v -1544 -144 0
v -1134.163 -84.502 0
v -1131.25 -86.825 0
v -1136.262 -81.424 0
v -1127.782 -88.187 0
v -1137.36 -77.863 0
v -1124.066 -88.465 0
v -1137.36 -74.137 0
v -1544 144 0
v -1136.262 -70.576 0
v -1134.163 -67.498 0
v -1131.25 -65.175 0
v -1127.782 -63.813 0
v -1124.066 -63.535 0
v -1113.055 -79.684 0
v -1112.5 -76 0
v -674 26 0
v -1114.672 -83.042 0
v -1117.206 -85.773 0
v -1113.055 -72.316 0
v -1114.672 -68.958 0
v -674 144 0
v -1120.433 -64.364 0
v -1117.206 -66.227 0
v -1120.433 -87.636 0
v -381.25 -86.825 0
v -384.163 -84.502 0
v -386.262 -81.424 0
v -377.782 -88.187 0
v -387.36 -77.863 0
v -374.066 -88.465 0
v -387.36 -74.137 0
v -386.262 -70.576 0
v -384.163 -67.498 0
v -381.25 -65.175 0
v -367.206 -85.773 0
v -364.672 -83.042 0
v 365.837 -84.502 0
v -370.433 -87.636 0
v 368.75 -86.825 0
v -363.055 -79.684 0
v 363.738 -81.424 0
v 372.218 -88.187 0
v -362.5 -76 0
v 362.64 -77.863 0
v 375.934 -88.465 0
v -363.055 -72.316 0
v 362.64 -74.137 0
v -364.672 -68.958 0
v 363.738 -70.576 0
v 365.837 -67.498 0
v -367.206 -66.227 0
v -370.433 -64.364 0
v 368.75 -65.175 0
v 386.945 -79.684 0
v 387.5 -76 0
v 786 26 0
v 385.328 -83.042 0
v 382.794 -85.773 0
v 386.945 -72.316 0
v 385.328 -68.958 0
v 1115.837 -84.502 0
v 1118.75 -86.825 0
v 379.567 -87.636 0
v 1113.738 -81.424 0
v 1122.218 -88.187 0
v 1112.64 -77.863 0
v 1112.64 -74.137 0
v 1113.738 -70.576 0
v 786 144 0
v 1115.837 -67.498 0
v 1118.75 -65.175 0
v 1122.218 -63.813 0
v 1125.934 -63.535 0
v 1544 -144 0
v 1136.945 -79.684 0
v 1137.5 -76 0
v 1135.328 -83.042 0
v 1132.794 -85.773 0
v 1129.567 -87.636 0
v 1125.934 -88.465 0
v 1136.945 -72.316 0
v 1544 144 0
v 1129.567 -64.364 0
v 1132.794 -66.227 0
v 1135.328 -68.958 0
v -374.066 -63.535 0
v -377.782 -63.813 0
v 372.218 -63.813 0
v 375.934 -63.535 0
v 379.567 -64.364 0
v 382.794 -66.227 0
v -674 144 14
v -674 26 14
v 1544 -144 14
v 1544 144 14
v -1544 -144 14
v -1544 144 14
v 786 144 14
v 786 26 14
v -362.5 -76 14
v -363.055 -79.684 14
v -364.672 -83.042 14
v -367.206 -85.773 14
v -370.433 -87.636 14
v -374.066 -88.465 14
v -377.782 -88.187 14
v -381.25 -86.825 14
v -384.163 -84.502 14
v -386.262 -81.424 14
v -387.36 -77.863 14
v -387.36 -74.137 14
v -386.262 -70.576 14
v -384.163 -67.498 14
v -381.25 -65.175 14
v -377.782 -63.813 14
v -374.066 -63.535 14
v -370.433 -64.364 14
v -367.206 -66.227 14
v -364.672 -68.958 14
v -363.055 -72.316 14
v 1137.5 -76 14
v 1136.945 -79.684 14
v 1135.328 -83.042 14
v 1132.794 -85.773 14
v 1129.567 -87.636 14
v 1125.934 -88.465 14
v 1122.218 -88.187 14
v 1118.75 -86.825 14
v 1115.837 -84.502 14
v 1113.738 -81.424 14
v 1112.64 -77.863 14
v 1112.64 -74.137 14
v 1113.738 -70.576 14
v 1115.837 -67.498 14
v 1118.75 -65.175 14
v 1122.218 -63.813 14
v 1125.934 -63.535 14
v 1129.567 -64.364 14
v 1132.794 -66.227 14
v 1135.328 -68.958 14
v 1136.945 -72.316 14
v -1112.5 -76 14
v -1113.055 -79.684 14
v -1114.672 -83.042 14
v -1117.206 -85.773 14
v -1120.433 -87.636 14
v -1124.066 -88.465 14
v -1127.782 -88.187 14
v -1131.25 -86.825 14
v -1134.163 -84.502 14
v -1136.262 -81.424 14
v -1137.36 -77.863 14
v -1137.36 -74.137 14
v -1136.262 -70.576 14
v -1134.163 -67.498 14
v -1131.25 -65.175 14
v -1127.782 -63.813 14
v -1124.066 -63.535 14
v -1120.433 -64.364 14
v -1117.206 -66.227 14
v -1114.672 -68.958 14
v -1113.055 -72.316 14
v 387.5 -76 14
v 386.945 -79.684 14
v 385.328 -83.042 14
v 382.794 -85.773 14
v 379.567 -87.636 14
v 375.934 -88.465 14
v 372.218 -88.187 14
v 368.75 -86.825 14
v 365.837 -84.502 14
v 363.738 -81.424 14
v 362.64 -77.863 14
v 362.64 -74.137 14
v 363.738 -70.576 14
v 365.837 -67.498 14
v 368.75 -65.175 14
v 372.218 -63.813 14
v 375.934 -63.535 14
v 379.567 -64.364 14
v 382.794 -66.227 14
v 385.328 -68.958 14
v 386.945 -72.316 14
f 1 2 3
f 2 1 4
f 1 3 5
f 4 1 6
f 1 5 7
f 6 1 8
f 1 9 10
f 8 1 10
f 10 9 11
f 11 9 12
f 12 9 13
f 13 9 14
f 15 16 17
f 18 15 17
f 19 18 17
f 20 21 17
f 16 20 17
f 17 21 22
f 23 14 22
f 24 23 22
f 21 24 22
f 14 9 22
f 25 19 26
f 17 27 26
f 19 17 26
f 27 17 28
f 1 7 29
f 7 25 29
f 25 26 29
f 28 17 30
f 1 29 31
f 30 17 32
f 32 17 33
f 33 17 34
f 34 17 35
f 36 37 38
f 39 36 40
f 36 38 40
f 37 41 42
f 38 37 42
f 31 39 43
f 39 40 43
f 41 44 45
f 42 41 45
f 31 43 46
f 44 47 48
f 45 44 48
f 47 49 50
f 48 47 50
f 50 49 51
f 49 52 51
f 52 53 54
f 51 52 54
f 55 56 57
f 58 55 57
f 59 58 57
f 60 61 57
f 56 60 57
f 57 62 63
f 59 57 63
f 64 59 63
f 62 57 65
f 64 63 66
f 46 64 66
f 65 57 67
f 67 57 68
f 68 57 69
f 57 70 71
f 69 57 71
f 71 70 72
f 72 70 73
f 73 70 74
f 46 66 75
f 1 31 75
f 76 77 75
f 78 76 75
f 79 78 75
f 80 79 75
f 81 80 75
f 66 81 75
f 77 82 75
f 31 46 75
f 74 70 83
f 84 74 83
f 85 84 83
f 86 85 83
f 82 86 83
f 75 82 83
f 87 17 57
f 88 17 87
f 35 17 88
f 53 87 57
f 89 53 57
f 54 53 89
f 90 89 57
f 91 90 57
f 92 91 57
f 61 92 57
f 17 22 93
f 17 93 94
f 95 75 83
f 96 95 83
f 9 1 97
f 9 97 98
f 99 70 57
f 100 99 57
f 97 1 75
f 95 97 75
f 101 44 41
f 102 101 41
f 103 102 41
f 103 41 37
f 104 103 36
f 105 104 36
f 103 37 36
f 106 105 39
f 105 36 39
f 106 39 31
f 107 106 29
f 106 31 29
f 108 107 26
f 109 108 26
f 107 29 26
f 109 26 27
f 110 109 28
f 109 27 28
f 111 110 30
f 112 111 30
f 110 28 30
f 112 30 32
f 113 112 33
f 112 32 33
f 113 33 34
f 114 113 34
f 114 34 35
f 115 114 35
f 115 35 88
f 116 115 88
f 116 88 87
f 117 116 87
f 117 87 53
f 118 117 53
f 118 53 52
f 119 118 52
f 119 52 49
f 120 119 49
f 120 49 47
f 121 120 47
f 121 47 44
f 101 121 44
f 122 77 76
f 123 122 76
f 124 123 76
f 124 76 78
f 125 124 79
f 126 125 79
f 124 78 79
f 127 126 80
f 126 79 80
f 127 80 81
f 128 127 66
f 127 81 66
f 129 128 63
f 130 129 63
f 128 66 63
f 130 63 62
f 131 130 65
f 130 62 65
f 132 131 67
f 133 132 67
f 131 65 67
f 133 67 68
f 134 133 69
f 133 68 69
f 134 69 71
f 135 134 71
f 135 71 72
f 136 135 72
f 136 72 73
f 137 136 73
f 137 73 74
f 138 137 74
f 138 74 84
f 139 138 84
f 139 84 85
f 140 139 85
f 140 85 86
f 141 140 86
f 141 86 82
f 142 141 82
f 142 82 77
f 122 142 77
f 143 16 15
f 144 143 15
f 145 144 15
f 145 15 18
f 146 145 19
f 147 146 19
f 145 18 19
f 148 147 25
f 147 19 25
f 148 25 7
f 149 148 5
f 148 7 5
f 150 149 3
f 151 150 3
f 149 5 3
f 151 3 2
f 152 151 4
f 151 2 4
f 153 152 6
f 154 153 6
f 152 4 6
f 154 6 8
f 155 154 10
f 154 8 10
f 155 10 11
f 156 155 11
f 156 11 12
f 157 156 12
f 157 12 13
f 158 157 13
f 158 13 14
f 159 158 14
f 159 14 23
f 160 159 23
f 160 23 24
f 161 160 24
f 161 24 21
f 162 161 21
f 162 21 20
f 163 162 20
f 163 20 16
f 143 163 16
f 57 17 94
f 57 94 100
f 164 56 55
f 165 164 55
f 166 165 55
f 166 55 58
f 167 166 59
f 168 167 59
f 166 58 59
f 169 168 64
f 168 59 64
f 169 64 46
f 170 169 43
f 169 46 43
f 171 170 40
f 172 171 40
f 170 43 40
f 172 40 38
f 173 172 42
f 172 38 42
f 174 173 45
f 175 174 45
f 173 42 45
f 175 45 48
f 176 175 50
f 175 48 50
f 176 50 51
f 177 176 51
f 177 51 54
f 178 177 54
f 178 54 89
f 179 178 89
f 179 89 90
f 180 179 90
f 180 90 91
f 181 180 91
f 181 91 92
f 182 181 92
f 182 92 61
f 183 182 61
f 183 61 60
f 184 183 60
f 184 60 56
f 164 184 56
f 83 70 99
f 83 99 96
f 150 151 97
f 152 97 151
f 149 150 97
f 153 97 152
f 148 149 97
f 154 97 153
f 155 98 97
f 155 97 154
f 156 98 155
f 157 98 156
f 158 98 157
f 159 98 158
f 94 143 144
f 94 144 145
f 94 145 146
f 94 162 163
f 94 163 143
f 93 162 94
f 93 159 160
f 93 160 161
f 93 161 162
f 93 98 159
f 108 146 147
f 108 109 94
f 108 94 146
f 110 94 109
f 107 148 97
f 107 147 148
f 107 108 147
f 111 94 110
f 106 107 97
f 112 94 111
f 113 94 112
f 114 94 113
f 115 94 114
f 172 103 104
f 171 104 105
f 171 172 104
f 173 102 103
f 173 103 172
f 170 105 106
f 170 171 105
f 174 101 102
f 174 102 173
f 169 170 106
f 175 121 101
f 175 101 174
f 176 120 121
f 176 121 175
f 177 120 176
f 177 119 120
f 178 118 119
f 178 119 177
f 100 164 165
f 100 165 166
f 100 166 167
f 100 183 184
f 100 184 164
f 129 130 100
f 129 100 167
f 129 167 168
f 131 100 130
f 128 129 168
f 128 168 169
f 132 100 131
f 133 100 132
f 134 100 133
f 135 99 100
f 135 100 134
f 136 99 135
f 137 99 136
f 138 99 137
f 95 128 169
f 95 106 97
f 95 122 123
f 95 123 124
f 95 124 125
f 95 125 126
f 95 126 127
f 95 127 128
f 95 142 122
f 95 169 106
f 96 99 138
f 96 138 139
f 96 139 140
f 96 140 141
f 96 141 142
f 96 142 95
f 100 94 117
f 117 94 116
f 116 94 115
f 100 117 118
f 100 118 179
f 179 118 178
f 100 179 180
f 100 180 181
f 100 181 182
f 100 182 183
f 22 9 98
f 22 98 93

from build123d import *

# Parameters (mm, degrees)
F0_W     = 3088
F0_H     = 288
F1_DEPTH = 14
F2_W     = 1460
F2_H     = 118
F3_DEPTH = 14.001
F4_R     = 12.5
F5_DEPTH = 25


with BuildPart() as f1:
    # F0 (on Top) → F1 (new body)
    with BuildSketch(Plane.XY):
        Rectangle(F0_W, F0_H)
    extrude(amount=F1_DEPTH)

    # F2 (on face) → F3 (cut, through all)
    with BuildSketch(Plane(origin=(0, 0, 0), x_dir=(1, 0, 0), z_dir=(0, 0, -1))):
        with Locations((56, -85)):
            Rectangle(F2_W, F2_H)
    extrude(amount=-F3_DEPTH, mode=Mode.SUBTRACT)

    # F4 (on face) → F5 (cut)
    with BuildSketch(Plane(origin=(0, 0, 0), x_dir=(1, 0, 0), z_dir=(0, 0, -1))):
        with Locations((-1125, 76)):
            Circle(F4_R)
        with Locations((-375, 76)):
            Circle(F4_R)
        with Locations((375, 76)):
            Circle(F4_R)
        with Locations((1125, 76)):
            Circle(F4_R)
    extrude(amount=-F5_DEPTH, mode=Mode.SUBTRACT)


solid = f1.part
